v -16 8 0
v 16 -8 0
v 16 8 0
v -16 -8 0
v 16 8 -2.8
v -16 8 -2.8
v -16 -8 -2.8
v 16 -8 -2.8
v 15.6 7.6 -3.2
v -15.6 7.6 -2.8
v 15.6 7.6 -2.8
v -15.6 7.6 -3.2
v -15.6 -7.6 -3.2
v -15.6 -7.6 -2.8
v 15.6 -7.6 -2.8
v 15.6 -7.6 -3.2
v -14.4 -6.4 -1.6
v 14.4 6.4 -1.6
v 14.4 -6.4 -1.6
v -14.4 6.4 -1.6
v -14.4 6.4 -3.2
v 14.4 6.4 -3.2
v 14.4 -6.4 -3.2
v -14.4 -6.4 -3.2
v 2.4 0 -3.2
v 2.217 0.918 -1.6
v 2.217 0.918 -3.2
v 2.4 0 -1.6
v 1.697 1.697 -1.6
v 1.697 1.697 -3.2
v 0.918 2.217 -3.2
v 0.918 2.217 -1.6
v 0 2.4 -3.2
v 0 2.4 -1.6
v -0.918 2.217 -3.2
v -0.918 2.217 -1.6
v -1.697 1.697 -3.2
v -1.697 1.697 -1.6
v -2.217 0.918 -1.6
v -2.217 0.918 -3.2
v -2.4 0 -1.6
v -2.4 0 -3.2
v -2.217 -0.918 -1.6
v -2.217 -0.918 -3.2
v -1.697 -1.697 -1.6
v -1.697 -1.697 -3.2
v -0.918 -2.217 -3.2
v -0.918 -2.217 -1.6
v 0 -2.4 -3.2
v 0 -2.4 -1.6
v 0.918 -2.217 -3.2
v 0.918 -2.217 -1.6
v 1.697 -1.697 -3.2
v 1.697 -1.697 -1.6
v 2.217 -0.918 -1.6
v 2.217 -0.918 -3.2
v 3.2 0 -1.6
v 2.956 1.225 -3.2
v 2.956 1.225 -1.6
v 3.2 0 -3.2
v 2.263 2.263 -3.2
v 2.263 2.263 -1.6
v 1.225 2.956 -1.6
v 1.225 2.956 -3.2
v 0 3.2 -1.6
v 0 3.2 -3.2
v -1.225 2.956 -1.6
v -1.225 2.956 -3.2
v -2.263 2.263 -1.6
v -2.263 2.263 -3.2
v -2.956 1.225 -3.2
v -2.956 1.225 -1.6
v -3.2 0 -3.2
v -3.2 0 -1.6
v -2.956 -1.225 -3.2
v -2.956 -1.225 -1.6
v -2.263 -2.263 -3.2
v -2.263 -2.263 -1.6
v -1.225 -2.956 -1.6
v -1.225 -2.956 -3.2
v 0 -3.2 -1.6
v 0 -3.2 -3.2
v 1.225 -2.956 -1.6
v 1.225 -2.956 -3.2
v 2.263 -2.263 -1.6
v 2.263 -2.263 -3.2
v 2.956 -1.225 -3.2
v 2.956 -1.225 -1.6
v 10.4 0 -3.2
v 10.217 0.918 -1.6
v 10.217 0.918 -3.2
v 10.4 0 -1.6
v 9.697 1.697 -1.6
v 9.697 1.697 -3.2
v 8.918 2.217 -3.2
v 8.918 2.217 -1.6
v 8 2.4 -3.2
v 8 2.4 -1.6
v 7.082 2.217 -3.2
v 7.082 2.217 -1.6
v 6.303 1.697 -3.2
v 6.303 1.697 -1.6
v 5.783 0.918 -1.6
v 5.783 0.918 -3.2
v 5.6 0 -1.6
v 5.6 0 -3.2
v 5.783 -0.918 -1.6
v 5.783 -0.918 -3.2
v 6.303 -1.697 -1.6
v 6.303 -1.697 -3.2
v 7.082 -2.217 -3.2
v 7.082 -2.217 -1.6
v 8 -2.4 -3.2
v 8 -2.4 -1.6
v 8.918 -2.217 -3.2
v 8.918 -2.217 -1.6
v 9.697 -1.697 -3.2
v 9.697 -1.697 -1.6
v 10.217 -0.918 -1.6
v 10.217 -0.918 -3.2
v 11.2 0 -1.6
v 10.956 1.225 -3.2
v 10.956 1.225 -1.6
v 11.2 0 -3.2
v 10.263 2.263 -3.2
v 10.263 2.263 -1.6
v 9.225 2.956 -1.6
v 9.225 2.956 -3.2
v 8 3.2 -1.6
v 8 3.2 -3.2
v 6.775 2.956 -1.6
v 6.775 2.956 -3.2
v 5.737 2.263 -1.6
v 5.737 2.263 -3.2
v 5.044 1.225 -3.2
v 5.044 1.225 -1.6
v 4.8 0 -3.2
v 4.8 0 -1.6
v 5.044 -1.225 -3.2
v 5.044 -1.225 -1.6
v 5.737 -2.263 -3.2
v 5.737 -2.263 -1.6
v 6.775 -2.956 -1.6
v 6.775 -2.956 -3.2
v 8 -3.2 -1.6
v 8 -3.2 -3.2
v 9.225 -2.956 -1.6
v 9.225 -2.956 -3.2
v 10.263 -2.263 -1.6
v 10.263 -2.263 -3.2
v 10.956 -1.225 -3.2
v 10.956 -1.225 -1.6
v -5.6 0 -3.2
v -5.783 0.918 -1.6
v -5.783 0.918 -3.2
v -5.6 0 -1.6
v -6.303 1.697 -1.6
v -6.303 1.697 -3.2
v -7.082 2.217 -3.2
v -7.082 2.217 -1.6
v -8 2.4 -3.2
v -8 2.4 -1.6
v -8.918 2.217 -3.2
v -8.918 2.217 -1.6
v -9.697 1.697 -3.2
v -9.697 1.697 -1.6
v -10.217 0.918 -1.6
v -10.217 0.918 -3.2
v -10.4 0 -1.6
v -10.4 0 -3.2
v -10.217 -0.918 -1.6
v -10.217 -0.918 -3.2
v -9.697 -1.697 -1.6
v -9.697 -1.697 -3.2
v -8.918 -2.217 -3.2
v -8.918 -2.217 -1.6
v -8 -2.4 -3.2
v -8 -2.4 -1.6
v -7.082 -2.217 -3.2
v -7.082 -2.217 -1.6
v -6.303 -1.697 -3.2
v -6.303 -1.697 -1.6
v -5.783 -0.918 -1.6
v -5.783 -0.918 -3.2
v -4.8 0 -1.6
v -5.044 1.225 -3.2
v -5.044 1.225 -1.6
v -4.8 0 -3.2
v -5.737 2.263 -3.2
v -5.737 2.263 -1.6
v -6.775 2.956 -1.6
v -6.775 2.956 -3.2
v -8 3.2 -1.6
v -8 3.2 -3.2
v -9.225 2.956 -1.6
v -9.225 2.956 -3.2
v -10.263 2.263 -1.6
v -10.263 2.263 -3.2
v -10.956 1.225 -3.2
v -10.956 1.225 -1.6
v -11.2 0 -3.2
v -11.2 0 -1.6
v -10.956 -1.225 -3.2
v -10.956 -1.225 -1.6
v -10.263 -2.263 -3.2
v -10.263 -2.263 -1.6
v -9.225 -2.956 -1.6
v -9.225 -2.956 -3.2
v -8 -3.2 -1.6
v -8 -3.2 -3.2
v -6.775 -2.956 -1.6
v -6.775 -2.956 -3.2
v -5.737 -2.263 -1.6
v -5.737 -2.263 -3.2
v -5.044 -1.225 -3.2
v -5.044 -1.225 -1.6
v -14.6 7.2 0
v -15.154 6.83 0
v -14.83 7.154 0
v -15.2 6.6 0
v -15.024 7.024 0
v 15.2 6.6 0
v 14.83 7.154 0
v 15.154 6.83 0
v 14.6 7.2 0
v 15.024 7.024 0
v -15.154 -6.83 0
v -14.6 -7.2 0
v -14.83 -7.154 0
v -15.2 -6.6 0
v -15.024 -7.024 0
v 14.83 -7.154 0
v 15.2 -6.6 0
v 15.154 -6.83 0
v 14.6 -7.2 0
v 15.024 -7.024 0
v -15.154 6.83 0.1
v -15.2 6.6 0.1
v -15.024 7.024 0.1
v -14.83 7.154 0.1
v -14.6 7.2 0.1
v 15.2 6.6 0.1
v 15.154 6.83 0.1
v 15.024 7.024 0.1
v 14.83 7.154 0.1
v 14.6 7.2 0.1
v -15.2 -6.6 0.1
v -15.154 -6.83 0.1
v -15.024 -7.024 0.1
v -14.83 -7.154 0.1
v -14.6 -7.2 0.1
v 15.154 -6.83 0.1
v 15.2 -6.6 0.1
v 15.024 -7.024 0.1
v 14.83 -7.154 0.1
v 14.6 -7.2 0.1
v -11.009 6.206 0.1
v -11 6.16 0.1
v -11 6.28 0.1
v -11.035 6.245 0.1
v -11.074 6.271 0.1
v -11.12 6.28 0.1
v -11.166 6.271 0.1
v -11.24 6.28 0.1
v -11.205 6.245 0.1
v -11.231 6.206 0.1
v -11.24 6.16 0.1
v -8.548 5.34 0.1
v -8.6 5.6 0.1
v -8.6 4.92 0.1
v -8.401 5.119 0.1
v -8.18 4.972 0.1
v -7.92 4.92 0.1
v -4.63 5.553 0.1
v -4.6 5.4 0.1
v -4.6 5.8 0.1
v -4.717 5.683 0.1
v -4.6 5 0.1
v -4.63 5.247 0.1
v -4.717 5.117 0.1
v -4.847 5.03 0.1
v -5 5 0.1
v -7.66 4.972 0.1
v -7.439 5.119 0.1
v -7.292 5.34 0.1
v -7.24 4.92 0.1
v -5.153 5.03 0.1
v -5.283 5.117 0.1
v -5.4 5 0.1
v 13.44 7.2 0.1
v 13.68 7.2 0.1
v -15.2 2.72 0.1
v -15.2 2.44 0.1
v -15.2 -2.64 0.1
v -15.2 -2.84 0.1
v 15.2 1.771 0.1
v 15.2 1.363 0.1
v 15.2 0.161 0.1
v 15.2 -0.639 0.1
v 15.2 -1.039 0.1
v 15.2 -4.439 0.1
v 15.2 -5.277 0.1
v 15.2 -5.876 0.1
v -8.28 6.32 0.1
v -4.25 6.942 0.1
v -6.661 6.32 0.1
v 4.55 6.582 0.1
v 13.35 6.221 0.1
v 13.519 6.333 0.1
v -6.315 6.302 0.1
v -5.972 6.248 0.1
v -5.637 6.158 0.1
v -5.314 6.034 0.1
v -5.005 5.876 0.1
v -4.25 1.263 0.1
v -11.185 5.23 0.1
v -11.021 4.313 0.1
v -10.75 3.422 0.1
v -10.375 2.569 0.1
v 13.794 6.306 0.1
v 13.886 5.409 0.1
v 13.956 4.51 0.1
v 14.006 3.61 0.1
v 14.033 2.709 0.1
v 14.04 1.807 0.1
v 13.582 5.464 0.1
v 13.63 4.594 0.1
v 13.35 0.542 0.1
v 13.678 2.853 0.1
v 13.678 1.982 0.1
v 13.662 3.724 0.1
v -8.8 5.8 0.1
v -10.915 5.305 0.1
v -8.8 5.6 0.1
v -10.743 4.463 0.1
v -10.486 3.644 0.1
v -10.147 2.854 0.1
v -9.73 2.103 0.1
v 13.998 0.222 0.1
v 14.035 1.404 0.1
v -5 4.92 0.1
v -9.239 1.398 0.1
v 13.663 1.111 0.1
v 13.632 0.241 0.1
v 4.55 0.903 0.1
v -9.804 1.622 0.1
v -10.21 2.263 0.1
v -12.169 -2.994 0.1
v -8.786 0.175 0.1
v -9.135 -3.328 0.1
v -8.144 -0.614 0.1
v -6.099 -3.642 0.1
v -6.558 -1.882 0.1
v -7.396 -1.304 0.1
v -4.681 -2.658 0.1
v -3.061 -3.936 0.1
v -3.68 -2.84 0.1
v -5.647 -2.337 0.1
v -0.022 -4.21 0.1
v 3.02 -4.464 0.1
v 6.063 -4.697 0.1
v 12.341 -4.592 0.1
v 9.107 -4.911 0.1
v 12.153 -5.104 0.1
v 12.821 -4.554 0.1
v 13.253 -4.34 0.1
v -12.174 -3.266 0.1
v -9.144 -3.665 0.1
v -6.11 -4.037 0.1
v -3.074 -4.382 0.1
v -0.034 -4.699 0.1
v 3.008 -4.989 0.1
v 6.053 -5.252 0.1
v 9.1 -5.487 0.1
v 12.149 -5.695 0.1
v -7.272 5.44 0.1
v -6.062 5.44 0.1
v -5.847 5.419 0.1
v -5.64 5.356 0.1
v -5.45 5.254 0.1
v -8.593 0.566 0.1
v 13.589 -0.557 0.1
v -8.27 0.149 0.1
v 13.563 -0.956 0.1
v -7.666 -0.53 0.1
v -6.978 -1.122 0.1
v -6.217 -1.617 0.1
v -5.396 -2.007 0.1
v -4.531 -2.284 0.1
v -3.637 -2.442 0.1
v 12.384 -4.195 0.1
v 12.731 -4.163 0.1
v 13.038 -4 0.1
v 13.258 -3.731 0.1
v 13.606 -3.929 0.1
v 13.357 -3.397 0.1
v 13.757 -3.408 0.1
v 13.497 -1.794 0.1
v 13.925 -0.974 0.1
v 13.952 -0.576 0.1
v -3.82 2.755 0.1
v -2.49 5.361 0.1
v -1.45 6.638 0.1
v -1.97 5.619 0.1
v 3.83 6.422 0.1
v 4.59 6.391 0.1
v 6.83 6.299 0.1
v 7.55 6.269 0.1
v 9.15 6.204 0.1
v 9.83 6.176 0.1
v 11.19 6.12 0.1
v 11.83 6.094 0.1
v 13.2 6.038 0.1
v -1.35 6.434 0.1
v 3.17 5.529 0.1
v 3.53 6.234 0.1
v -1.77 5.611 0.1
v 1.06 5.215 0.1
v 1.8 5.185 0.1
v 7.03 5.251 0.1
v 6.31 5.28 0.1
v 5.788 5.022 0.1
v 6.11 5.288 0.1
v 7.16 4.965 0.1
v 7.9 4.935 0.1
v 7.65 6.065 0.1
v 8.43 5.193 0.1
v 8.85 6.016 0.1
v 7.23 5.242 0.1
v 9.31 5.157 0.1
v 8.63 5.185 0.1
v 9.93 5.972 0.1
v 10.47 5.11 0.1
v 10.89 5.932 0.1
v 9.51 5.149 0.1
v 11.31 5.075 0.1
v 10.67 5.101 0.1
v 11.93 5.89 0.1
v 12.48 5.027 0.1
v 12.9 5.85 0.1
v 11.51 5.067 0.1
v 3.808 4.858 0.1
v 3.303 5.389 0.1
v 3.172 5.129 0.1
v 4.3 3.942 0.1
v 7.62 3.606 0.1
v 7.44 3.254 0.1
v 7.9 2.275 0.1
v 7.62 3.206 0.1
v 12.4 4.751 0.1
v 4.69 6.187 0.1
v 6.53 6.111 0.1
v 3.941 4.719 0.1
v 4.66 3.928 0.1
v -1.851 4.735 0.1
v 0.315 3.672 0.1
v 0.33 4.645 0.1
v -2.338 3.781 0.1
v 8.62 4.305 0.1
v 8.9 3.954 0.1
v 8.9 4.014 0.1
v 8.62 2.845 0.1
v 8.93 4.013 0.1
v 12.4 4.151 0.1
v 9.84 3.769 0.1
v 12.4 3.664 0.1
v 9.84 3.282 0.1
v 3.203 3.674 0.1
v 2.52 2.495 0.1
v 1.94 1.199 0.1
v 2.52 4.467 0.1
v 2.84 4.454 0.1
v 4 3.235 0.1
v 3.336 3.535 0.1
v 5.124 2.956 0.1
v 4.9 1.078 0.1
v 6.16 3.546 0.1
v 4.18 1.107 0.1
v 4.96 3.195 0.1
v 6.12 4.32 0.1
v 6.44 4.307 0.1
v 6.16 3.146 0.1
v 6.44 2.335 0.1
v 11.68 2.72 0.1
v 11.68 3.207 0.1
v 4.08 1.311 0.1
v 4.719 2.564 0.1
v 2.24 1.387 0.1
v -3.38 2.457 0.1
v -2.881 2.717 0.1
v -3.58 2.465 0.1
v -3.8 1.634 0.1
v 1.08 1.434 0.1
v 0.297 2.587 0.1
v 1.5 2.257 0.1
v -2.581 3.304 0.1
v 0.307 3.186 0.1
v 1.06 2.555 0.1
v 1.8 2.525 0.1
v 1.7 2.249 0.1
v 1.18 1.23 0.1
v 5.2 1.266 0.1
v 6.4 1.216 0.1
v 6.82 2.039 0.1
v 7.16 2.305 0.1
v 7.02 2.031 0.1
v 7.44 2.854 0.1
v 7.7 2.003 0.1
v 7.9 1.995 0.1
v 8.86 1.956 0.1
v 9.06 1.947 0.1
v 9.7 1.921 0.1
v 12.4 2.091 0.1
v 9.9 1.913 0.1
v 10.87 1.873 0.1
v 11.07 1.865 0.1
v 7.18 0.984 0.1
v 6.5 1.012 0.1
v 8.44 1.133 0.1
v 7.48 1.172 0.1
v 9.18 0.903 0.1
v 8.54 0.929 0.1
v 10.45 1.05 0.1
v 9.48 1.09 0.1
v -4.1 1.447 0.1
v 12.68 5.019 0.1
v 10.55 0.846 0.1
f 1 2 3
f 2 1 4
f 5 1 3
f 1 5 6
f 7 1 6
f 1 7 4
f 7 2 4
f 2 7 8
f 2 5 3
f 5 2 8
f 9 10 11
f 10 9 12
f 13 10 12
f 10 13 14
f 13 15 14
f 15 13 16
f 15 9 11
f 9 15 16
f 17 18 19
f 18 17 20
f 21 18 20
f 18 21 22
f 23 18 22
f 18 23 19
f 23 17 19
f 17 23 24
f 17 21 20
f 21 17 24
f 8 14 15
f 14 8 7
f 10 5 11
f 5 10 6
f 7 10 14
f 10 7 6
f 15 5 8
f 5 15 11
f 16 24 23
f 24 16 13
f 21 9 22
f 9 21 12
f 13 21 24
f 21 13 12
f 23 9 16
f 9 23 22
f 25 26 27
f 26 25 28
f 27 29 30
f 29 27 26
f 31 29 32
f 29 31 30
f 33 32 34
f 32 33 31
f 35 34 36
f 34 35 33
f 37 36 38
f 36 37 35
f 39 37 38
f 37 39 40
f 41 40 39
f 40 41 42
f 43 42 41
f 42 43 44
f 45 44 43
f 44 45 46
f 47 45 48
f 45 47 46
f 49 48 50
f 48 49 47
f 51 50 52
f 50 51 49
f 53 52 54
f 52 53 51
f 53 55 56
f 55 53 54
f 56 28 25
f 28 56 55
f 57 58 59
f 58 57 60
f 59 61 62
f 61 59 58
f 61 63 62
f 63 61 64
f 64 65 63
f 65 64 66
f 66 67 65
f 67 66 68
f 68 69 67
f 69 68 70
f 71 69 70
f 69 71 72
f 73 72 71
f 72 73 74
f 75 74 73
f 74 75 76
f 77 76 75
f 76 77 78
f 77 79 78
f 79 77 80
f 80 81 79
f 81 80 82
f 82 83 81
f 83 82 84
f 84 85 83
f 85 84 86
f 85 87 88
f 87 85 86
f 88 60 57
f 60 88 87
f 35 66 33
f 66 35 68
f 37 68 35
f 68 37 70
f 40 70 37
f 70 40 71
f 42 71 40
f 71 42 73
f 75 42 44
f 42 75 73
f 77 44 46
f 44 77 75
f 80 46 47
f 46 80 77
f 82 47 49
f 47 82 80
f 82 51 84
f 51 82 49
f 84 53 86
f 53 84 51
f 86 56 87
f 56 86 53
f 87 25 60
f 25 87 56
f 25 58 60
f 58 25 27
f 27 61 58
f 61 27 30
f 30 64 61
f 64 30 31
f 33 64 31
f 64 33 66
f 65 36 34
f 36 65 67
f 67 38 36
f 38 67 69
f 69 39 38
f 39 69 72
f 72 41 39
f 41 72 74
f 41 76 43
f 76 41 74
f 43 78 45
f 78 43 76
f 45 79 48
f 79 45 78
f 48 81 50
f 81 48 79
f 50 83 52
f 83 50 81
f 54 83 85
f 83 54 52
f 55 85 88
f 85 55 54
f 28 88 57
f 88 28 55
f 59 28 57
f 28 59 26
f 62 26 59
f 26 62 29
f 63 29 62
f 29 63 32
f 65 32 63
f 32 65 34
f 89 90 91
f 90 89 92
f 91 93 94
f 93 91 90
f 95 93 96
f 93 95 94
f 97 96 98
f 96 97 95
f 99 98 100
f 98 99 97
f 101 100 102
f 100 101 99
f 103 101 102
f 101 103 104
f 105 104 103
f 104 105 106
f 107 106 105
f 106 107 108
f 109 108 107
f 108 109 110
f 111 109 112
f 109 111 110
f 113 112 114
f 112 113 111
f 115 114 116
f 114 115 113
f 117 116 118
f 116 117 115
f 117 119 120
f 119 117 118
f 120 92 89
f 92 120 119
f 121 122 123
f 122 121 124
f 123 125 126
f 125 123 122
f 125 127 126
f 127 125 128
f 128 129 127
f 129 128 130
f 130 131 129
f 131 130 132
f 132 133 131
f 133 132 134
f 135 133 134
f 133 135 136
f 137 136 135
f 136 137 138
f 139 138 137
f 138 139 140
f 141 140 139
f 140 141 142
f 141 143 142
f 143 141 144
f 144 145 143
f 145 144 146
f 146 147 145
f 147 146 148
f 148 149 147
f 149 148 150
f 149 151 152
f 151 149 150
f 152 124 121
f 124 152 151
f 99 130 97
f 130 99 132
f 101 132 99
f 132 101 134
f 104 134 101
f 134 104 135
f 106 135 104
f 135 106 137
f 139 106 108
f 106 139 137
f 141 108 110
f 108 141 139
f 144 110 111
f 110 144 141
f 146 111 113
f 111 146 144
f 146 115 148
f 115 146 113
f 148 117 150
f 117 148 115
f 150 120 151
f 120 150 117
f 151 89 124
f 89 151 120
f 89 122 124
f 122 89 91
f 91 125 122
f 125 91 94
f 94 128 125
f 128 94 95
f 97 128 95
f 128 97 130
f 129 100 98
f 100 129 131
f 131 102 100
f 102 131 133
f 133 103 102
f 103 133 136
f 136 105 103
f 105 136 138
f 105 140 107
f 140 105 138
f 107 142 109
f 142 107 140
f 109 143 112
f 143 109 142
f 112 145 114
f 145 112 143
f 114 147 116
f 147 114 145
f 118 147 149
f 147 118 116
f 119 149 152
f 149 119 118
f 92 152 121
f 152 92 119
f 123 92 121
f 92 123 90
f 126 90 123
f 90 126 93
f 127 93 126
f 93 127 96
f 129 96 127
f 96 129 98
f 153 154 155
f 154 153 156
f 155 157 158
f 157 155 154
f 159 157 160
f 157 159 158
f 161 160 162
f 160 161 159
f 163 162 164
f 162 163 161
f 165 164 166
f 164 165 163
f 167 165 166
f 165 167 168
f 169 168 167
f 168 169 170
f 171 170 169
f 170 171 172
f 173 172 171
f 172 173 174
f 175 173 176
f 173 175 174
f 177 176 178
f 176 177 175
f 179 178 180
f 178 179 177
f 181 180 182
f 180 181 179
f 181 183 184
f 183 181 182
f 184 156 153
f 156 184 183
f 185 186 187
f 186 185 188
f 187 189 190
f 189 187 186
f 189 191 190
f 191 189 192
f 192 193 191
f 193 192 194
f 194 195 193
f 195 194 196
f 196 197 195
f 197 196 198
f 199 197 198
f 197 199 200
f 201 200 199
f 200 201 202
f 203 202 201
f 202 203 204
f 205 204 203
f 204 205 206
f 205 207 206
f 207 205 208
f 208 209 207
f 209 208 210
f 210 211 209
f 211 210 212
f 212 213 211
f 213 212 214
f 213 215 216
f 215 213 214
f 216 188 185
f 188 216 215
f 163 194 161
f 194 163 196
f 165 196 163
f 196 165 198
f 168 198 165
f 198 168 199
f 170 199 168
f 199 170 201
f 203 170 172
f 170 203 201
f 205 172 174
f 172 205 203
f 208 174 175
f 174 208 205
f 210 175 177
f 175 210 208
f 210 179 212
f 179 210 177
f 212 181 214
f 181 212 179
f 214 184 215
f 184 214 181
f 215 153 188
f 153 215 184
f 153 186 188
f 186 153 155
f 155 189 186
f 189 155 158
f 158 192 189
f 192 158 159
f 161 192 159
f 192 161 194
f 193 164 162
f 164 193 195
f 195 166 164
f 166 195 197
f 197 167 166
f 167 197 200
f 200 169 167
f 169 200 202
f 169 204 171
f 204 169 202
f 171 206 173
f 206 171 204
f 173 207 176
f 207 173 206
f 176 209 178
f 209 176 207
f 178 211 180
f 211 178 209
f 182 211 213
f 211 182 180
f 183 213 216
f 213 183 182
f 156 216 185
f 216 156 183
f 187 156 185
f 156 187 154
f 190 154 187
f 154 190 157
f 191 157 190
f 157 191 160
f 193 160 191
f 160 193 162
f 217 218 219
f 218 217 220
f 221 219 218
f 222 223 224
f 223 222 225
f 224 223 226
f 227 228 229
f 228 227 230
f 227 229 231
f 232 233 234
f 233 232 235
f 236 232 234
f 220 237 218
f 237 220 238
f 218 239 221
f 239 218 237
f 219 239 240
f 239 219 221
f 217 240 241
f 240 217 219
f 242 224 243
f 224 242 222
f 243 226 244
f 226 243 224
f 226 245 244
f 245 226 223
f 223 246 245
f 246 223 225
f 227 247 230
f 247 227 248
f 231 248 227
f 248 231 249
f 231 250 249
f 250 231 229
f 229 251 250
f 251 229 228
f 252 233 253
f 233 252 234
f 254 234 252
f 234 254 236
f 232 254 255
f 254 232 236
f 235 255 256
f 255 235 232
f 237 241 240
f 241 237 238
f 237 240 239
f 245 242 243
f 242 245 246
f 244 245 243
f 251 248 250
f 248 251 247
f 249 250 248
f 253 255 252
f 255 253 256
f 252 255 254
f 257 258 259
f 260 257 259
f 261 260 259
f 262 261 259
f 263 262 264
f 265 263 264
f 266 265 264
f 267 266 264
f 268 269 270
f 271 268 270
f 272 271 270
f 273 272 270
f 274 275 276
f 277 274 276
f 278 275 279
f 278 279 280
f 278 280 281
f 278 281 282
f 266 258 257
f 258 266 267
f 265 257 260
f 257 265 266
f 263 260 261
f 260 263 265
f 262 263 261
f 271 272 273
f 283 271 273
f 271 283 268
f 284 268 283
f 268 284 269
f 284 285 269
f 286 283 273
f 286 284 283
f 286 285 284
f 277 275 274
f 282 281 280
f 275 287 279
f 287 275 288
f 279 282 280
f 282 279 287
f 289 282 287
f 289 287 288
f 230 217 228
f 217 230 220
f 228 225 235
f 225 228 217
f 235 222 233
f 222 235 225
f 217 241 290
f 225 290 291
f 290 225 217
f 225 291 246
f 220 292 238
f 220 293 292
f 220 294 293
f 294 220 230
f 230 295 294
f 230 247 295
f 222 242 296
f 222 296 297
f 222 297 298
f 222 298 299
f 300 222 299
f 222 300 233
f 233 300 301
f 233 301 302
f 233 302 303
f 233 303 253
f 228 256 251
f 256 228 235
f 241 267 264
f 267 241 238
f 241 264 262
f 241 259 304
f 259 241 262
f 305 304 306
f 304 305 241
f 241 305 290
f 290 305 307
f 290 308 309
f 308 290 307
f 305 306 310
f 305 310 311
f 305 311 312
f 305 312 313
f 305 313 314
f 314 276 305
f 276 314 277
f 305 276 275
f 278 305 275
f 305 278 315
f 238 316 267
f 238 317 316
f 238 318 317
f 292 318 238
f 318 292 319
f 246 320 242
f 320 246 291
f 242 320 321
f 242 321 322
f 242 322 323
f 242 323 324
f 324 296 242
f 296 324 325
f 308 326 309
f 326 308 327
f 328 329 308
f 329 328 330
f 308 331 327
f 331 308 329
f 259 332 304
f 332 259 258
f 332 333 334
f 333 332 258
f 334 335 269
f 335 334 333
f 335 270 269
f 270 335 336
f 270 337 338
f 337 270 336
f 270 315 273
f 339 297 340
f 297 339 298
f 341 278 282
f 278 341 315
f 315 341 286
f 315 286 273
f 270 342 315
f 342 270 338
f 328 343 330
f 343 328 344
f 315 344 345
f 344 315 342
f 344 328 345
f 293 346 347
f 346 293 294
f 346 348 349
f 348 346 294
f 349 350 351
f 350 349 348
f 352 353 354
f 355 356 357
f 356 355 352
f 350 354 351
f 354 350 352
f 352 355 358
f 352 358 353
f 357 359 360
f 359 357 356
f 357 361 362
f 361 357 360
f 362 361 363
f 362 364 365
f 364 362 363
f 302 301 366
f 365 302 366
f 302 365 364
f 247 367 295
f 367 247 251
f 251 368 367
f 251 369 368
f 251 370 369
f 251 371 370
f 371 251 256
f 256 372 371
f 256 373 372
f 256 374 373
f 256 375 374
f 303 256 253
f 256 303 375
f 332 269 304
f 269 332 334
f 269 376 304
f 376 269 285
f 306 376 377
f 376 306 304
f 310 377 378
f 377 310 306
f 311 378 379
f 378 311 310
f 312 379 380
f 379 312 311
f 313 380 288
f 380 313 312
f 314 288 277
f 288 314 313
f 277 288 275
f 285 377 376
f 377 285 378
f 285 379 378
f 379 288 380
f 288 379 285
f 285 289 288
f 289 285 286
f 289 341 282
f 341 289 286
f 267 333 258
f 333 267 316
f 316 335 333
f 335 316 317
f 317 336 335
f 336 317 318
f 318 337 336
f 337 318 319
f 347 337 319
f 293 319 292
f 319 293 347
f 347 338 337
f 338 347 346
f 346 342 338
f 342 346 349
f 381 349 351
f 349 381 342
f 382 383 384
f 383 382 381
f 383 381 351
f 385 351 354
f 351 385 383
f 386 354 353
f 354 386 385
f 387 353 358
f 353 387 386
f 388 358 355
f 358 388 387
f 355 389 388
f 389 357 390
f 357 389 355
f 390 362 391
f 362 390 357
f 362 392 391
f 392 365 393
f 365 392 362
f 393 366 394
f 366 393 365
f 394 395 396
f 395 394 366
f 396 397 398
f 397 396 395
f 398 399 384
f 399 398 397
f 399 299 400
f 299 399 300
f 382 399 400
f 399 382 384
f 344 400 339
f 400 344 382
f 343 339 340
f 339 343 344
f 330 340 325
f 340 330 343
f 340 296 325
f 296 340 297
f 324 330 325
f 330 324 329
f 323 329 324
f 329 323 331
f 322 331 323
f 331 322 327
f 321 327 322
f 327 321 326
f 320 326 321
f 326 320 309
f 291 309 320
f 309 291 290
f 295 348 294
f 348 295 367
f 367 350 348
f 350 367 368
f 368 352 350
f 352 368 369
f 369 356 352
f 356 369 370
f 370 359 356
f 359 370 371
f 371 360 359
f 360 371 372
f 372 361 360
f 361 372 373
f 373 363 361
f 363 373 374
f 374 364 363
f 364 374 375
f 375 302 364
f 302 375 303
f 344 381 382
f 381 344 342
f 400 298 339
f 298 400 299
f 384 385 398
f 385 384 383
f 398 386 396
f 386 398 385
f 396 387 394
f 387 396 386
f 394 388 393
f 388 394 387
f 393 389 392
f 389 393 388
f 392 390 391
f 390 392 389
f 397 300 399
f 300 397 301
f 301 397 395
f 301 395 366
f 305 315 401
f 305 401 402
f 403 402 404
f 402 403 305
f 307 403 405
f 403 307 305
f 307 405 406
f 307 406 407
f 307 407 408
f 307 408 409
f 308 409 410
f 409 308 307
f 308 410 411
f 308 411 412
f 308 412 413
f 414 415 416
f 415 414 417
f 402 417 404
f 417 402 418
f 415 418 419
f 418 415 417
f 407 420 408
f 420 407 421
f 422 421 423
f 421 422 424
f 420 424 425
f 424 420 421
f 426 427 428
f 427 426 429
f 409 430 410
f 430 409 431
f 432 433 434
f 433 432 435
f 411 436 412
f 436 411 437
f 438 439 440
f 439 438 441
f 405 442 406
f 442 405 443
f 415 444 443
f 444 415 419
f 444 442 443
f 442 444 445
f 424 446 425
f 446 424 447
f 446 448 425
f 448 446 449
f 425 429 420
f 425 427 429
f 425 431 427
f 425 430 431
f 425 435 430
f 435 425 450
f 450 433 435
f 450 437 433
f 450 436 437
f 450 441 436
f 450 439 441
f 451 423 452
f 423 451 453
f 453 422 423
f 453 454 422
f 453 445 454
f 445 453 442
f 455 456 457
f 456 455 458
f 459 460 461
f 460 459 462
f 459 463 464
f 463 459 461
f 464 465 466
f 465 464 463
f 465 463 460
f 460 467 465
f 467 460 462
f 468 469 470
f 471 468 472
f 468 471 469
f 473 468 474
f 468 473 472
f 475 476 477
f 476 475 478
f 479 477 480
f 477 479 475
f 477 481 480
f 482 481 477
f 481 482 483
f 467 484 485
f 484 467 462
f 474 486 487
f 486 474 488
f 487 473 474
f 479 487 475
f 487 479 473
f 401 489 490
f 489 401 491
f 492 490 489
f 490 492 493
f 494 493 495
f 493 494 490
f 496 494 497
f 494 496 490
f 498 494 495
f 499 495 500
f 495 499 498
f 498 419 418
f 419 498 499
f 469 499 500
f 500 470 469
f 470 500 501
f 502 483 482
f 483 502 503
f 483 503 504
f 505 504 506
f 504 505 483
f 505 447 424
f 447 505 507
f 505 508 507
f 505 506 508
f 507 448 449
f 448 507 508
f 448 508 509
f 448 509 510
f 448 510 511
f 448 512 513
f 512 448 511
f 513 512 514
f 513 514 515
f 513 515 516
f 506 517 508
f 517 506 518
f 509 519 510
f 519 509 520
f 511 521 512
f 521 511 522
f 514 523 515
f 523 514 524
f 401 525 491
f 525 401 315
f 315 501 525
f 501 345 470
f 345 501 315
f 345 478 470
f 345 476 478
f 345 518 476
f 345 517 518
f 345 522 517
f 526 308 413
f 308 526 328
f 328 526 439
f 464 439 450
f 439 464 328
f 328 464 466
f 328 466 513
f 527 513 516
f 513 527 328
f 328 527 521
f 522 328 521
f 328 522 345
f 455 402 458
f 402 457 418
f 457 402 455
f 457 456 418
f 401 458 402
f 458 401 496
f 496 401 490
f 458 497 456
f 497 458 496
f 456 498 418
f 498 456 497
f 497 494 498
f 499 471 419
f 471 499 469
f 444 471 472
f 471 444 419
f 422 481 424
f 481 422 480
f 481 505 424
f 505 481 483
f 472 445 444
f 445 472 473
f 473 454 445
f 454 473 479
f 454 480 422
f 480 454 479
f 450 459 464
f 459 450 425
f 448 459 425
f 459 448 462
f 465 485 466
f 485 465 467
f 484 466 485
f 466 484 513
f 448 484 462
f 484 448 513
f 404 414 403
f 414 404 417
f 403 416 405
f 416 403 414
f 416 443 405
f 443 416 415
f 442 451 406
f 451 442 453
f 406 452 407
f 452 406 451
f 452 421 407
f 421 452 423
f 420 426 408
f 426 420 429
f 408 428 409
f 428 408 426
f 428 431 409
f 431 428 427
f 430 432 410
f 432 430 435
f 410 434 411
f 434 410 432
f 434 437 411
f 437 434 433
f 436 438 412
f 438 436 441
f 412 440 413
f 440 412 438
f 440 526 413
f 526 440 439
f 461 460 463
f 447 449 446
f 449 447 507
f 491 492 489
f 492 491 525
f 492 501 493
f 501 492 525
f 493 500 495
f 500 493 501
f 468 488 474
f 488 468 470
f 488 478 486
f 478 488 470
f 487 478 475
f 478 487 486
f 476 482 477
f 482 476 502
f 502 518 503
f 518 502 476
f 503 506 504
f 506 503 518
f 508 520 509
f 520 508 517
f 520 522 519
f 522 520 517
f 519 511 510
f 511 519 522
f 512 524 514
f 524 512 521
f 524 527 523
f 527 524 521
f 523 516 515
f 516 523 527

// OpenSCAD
use <../lib.scad>
use <6177741j.scad>
use <87079.scad>
function ldraw_lib__87079d1i() = [
// 0 Tile  2 x  4 with Door Outline with Yellow Stripes and White AMG Logo on Transparent Background Right Sticker
// 0 Name: 87079d1i.dat
// 0 Author: Alfred Schmitz [AlfredS]
// 0 !LDRAW_ORG Shortcut UPDATE 2026-08
// 0 !LICENSE Licensed under CC BY 4.0 : see CAreadme.txt
// 
// 0 BFC CERTIFY CCW
  [0,"BFC","CERTIFY"],
  [0,"BFC","CCW"],
// 
// 0 !CATEGORY Sticker Shortcut
// 0 !KEYWORDS AMG, GT3, Mercedes, Set 75877, Speed Champions
// 
// 0 !HISTORY 2026-08-31 [OrionP] Official Update 2026-08
// 
// 1 16 0 0 0 1 0 0 0 1 0 0 0 1 87079.dat
  [1,16,0,0,0,1,0,0,0,1,0,0,0,1, ldraw_lib__87079()],
// 1 16 0 0 0 1 0 0 0 1 0 0 0 1 6177741j.dat
  [1,16,0,0,0,1,0,0,0,1,0,0,0,1, ldraw_lib__6177741j()],
];
module ldraw_lib__87079d1i(step=0, col=false, unit=2/5, alt=false, line=0.2, solid=!$preview)
    makepoly(ldraw_lib__87079d1i(), step=step, col=col, unit=unit, alt=alt, line=line, solid=solid);
ldraw_lib__87079d1i(line=0.2);
